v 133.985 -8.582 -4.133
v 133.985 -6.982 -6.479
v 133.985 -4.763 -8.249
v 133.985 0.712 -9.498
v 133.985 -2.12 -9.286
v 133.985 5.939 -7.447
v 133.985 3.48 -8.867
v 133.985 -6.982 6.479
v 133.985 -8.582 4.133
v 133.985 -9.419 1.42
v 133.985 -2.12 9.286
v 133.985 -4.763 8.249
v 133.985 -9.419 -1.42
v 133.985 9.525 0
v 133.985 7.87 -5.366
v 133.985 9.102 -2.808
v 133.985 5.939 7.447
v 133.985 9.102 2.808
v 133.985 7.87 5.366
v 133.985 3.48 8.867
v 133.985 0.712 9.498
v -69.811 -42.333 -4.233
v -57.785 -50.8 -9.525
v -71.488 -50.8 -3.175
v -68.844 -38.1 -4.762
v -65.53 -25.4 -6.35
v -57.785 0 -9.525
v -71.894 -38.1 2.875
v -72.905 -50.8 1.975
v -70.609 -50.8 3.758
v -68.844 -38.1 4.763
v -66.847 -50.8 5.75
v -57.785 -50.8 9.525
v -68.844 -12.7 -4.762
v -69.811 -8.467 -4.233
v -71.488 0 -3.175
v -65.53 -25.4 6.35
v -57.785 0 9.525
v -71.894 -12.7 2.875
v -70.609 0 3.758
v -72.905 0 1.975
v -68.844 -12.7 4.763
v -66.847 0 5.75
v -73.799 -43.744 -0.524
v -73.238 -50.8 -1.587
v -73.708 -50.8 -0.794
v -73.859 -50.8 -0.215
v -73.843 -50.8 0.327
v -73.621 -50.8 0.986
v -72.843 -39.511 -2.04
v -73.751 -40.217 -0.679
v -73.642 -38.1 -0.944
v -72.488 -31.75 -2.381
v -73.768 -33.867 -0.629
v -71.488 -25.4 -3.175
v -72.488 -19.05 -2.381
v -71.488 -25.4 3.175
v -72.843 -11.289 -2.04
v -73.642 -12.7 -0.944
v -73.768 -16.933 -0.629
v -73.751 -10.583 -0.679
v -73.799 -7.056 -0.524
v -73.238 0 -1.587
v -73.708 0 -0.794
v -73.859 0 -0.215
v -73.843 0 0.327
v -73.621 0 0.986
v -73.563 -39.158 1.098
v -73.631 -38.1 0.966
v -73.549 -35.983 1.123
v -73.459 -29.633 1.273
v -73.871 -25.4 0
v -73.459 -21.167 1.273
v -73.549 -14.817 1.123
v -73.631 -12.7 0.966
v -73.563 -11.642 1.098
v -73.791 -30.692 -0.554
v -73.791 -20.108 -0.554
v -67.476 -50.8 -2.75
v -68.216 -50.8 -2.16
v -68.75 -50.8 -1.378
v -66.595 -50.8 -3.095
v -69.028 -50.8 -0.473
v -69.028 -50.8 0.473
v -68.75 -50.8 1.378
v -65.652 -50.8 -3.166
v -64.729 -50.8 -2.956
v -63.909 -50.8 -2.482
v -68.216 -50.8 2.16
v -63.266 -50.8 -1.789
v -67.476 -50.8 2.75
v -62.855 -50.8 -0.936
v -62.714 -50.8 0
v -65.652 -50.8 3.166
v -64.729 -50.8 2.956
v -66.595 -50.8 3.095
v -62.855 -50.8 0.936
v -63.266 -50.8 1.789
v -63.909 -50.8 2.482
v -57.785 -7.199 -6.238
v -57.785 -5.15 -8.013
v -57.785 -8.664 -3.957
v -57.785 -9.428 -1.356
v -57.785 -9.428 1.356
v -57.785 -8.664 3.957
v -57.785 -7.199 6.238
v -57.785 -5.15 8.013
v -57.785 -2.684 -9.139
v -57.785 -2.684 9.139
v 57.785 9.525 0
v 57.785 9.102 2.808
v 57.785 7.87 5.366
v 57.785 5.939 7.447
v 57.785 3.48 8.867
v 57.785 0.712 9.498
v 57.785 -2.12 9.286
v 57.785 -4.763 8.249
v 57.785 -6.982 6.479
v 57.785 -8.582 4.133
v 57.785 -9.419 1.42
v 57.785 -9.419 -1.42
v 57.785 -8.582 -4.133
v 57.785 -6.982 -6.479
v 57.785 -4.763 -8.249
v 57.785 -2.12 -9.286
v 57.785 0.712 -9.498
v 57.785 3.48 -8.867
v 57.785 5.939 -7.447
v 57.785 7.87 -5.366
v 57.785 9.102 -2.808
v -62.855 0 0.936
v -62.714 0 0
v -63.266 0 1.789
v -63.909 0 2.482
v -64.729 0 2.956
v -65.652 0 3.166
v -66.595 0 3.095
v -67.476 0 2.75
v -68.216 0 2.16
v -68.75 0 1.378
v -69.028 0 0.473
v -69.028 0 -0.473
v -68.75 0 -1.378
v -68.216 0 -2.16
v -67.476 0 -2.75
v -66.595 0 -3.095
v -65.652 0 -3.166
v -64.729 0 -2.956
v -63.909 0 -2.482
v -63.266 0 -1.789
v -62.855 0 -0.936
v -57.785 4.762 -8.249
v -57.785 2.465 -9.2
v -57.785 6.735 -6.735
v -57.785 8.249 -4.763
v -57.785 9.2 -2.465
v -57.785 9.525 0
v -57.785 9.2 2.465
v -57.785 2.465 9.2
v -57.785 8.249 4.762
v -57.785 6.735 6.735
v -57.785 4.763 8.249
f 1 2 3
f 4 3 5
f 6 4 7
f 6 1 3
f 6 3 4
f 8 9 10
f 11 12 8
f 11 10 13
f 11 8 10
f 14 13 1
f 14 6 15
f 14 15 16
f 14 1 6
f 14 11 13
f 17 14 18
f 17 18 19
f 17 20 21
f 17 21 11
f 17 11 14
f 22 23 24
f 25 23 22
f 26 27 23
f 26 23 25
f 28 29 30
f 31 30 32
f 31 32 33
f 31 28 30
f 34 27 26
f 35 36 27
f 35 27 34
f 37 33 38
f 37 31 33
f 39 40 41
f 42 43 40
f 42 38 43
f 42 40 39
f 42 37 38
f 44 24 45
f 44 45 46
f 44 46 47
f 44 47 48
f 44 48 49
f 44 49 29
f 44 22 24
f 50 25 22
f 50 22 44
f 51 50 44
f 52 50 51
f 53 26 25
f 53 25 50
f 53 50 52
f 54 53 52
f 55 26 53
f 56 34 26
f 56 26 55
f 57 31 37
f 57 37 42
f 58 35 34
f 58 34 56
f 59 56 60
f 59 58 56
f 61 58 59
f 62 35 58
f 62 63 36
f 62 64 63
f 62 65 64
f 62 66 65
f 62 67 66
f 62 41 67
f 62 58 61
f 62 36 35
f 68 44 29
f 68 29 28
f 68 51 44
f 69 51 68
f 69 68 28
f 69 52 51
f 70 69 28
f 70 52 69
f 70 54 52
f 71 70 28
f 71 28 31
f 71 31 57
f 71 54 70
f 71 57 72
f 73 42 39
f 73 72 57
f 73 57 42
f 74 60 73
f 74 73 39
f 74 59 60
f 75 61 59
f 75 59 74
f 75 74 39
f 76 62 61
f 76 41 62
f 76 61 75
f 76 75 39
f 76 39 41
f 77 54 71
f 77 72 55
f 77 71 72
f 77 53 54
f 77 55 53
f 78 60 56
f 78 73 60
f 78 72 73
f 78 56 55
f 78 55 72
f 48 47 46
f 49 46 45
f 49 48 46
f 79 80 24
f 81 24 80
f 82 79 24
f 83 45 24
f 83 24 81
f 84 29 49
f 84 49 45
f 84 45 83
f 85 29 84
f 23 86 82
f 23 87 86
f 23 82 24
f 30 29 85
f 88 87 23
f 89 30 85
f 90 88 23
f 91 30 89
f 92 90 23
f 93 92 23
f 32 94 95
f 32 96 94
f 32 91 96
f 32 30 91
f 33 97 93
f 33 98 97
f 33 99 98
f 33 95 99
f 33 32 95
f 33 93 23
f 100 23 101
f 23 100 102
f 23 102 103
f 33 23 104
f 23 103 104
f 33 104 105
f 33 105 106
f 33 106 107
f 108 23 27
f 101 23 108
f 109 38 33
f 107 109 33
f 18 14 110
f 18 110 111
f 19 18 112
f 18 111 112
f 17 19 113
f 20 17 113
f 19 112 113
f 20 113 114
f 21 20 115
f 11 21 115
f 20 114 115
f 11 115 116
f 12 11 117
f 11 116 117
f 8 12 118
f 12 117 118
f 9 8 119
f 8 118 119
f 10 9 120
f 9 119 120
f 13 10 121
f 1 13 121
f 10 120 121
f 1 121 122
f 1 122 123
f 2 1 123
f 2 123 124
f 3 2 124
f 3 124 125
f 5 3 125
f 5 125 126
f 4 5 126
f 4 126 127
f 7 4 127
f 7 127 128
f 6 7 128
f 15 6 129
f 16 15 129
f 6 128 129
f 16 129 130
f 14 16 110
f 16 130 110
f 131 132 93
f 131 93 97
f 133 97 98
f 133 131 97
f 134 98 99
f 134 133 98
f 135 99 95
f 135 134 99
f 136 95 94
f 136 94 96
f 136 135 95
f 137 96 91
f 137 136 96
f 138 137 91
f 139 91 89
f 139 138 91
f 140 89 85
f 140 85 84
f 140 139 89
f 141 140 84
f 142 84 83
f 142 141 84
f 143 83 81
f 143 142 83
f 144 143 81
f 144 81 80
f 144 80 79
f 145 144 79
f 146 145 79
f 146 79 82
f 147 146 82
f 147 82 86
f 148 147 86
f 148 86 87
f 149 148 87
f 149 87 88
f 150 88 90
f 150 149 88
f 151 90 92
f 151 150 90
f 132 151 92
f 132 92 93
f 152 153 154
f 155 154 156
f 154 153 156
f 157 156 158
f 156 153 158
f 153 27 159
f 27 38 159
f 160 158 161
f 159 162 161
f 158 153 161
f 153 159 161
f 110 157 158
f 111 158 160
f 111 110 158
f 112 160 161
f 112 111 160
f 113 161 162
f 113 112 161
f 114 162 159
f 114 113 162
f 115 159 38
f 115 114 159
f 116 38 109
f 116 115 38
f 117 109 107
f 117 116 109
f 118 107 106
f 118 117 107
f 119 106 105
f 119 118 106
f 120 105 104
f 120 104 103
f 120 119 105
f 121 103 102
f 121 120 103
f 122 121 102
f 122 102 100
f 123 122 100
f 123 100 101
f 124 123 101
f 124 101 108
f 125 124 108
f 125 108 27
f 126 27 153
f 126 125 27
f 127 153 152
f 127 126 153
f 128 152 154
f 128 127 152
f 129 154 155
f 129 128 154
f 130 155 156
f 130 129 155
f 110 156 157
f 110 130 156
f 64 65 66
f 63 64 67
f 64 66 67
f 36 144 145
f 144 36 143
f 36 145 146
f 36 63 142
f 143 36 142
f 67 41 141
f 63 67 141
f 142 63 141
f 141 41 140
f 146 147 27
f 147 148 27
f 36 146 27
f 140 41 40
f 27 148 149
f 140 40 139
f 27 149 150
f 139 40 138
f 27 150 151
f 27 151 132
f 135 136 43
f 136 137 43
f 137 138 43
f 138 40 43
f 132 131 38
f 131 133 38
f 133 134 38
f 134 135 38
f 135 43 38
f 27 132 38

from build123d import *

# Parameters (mm, degrees)
F0_R     = 9.525
F1_DEPTH = 57.785
F2_R     = 3.175
F3_DEPTH = 50.8
F4_R     = 9.525
F5_DEPTH = 76.2


with BuildPart() as f1:
    # F0 (on Right) → F1 (new body, symmetric)
    with BuildSketch(Plane.YZ):
        Circle(F0_R)
    extrude(amount=F1_DEPTH, both=True)

    # F2 (on Front) → F3 (join)
    with BuildSketch(Plane.XZ):
        with BuildLine():
            Line((-57.785, -9.525), (-57.785, 0))
            Line((-57.785, 0), (-57.785, 9.525))
            add(Edge.make_bspline(
                [(-57.785, -9.525), (-65.827919, -6.35), (-81.913757, 0), (-65.827919, 6.35), (-57.785, 9.525)],
                knots=[0, 0, 0, 0, 18.694379, 37.388758, 37.388758, 37.388758, 37.388758], degree=3))
        make_face()
        with Locations((-65.888949, 0)):
            Circle(F2_R, mode=Mode.SUBTRACT)
    extrude(amount=F3_DEPTH)

    # F4 (on face) → F5 (join)
    with BuildSketch(Plane.YZ.offset(57.785)):
        Circle(F4_R)
    extrude(amount=F5_DEPTH)


solid = f1.part
